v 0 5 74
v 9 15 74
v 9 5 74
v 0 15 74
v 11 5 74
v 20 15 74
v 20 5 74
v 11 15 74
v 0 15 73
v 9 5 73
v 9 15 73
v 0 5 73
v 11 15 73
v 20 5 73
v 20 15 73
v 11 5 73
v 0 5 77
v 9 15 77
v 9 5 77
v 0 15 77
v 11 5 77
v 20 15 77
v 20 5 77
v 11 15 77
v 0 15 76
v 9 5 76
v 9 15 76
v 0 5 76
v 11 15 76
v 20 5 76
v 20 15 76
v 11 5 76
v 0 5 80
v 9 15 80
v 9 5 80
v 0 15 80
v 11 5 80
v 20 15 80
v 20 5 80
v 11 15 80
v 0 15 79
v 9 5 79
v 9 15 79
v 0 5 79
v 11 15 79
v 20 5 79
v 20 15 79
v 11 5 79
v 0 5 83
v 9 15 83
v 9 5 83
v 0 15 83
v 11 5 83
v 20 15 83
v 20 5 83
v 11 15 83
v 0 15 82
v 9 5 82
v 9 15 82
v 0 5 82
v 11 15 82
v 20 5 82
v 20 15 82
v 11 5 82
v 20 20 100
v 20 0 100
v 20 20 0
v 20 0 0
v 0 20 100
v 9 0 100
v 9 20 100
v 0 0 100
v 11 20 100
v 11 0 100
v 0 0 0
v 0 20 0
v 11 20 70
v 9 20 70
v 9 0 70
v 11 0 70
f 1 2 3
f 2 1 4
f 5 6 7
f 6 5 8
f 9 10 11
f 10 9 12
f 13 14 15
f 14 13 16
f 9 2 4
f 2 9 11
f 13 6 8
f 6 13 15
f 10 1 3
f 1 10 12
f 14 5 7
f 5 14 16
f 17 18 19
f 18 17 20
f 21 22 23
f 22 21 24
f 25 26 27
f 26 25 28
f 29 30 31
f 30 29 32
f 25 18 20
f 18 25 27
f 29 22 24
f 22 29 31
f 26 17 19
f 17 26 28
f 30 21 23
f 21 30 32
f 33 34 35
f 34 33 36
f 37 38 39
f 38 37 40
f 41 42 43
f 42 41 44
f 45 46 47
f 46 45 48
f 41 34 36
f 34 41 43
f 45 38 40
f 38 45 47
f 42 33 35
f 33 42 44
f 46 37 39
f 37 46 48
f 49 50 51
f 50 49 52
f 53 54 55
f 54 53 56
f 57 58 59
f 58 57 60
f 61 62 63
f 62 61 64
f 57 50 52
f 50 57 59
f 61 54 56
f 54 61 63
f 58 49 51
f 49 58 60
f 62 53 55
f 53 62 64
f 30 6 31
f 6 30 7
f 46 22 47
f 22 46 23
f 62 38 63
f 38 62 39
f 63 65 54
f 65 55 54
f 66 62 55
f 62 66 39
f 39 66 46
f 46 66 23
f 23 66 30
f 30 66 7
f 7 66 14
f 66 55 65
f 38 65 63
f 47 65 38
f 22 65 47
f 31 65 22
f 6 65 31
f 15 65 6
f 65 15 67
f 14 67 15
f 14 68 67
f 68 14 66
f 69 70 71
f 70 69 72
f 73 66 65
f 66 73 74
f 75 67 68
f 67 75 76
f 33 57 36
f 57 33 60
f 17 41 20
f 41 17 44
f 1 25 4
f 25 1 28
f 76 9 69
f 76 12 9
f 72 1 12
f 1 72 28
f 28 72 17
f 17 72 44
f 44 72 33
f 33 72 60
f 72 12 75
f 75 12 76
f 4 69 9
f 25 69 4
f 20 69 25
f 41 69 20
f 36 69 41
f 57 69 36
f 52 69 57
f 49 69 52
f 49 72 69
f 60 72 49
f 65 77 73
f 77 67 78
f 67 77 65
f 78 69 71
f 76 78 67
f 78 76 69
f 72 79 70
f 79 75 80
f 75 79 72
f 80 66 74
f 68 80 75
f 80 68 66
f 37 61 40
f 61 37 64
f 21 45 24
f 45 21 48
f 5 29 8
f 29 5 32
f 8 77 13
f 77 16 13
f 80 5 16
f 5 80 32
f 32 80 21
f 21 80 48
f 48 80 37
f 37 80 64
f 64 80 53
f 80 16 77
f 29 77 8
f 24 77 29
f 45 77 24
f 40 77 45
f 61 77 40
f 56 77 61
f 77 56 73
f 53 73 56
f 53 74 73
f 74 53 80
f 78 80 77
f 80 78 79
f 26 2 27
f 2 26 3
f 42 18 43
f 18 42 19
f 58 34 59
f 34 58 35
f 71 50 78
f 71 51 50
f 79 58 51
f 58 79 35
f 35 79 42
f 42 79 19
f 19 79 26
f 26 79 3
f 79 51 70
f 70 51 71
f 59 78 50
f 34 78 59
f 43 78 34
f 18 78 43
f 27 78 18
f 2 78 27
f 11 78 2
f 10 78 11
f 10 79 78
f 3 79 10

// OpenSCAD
// Handle to hold a cutter blade and cut out plastic bottles in slat

/* [Handle] */
// length (X)
handleLG = 20;
// Width (Y)
handleWD = 20;
// Height (Z)
handleHT = 100;

/* [Slot] */
// Width (X)
slotWD = 2;
// Height (Z)
slotHT = 30;

/* [Holes] */
// Numbers
holesNB = 4;
// Length (Y)
holesLT = 10;
// Thickness (Z)
holesTH = 1;
// Gap
holesGap = 3;

difference ()
{
    cube([handleLG, handleWD, handleHT]);
    
    translate([(handleLG-slotWD)/2,-0.01,handleHT-slotHT])
    cube([slotWD,handleWD+0.02,slotHT+0.01]);
    
    for (i=[1:holesNB])
    {
        translate([-0.01,(handleWD-holesLT)/2,handleHT-slotHT+i*holesGap])
        cube([handleLG+0.02,holesLT,holesTH]);
    }
}
